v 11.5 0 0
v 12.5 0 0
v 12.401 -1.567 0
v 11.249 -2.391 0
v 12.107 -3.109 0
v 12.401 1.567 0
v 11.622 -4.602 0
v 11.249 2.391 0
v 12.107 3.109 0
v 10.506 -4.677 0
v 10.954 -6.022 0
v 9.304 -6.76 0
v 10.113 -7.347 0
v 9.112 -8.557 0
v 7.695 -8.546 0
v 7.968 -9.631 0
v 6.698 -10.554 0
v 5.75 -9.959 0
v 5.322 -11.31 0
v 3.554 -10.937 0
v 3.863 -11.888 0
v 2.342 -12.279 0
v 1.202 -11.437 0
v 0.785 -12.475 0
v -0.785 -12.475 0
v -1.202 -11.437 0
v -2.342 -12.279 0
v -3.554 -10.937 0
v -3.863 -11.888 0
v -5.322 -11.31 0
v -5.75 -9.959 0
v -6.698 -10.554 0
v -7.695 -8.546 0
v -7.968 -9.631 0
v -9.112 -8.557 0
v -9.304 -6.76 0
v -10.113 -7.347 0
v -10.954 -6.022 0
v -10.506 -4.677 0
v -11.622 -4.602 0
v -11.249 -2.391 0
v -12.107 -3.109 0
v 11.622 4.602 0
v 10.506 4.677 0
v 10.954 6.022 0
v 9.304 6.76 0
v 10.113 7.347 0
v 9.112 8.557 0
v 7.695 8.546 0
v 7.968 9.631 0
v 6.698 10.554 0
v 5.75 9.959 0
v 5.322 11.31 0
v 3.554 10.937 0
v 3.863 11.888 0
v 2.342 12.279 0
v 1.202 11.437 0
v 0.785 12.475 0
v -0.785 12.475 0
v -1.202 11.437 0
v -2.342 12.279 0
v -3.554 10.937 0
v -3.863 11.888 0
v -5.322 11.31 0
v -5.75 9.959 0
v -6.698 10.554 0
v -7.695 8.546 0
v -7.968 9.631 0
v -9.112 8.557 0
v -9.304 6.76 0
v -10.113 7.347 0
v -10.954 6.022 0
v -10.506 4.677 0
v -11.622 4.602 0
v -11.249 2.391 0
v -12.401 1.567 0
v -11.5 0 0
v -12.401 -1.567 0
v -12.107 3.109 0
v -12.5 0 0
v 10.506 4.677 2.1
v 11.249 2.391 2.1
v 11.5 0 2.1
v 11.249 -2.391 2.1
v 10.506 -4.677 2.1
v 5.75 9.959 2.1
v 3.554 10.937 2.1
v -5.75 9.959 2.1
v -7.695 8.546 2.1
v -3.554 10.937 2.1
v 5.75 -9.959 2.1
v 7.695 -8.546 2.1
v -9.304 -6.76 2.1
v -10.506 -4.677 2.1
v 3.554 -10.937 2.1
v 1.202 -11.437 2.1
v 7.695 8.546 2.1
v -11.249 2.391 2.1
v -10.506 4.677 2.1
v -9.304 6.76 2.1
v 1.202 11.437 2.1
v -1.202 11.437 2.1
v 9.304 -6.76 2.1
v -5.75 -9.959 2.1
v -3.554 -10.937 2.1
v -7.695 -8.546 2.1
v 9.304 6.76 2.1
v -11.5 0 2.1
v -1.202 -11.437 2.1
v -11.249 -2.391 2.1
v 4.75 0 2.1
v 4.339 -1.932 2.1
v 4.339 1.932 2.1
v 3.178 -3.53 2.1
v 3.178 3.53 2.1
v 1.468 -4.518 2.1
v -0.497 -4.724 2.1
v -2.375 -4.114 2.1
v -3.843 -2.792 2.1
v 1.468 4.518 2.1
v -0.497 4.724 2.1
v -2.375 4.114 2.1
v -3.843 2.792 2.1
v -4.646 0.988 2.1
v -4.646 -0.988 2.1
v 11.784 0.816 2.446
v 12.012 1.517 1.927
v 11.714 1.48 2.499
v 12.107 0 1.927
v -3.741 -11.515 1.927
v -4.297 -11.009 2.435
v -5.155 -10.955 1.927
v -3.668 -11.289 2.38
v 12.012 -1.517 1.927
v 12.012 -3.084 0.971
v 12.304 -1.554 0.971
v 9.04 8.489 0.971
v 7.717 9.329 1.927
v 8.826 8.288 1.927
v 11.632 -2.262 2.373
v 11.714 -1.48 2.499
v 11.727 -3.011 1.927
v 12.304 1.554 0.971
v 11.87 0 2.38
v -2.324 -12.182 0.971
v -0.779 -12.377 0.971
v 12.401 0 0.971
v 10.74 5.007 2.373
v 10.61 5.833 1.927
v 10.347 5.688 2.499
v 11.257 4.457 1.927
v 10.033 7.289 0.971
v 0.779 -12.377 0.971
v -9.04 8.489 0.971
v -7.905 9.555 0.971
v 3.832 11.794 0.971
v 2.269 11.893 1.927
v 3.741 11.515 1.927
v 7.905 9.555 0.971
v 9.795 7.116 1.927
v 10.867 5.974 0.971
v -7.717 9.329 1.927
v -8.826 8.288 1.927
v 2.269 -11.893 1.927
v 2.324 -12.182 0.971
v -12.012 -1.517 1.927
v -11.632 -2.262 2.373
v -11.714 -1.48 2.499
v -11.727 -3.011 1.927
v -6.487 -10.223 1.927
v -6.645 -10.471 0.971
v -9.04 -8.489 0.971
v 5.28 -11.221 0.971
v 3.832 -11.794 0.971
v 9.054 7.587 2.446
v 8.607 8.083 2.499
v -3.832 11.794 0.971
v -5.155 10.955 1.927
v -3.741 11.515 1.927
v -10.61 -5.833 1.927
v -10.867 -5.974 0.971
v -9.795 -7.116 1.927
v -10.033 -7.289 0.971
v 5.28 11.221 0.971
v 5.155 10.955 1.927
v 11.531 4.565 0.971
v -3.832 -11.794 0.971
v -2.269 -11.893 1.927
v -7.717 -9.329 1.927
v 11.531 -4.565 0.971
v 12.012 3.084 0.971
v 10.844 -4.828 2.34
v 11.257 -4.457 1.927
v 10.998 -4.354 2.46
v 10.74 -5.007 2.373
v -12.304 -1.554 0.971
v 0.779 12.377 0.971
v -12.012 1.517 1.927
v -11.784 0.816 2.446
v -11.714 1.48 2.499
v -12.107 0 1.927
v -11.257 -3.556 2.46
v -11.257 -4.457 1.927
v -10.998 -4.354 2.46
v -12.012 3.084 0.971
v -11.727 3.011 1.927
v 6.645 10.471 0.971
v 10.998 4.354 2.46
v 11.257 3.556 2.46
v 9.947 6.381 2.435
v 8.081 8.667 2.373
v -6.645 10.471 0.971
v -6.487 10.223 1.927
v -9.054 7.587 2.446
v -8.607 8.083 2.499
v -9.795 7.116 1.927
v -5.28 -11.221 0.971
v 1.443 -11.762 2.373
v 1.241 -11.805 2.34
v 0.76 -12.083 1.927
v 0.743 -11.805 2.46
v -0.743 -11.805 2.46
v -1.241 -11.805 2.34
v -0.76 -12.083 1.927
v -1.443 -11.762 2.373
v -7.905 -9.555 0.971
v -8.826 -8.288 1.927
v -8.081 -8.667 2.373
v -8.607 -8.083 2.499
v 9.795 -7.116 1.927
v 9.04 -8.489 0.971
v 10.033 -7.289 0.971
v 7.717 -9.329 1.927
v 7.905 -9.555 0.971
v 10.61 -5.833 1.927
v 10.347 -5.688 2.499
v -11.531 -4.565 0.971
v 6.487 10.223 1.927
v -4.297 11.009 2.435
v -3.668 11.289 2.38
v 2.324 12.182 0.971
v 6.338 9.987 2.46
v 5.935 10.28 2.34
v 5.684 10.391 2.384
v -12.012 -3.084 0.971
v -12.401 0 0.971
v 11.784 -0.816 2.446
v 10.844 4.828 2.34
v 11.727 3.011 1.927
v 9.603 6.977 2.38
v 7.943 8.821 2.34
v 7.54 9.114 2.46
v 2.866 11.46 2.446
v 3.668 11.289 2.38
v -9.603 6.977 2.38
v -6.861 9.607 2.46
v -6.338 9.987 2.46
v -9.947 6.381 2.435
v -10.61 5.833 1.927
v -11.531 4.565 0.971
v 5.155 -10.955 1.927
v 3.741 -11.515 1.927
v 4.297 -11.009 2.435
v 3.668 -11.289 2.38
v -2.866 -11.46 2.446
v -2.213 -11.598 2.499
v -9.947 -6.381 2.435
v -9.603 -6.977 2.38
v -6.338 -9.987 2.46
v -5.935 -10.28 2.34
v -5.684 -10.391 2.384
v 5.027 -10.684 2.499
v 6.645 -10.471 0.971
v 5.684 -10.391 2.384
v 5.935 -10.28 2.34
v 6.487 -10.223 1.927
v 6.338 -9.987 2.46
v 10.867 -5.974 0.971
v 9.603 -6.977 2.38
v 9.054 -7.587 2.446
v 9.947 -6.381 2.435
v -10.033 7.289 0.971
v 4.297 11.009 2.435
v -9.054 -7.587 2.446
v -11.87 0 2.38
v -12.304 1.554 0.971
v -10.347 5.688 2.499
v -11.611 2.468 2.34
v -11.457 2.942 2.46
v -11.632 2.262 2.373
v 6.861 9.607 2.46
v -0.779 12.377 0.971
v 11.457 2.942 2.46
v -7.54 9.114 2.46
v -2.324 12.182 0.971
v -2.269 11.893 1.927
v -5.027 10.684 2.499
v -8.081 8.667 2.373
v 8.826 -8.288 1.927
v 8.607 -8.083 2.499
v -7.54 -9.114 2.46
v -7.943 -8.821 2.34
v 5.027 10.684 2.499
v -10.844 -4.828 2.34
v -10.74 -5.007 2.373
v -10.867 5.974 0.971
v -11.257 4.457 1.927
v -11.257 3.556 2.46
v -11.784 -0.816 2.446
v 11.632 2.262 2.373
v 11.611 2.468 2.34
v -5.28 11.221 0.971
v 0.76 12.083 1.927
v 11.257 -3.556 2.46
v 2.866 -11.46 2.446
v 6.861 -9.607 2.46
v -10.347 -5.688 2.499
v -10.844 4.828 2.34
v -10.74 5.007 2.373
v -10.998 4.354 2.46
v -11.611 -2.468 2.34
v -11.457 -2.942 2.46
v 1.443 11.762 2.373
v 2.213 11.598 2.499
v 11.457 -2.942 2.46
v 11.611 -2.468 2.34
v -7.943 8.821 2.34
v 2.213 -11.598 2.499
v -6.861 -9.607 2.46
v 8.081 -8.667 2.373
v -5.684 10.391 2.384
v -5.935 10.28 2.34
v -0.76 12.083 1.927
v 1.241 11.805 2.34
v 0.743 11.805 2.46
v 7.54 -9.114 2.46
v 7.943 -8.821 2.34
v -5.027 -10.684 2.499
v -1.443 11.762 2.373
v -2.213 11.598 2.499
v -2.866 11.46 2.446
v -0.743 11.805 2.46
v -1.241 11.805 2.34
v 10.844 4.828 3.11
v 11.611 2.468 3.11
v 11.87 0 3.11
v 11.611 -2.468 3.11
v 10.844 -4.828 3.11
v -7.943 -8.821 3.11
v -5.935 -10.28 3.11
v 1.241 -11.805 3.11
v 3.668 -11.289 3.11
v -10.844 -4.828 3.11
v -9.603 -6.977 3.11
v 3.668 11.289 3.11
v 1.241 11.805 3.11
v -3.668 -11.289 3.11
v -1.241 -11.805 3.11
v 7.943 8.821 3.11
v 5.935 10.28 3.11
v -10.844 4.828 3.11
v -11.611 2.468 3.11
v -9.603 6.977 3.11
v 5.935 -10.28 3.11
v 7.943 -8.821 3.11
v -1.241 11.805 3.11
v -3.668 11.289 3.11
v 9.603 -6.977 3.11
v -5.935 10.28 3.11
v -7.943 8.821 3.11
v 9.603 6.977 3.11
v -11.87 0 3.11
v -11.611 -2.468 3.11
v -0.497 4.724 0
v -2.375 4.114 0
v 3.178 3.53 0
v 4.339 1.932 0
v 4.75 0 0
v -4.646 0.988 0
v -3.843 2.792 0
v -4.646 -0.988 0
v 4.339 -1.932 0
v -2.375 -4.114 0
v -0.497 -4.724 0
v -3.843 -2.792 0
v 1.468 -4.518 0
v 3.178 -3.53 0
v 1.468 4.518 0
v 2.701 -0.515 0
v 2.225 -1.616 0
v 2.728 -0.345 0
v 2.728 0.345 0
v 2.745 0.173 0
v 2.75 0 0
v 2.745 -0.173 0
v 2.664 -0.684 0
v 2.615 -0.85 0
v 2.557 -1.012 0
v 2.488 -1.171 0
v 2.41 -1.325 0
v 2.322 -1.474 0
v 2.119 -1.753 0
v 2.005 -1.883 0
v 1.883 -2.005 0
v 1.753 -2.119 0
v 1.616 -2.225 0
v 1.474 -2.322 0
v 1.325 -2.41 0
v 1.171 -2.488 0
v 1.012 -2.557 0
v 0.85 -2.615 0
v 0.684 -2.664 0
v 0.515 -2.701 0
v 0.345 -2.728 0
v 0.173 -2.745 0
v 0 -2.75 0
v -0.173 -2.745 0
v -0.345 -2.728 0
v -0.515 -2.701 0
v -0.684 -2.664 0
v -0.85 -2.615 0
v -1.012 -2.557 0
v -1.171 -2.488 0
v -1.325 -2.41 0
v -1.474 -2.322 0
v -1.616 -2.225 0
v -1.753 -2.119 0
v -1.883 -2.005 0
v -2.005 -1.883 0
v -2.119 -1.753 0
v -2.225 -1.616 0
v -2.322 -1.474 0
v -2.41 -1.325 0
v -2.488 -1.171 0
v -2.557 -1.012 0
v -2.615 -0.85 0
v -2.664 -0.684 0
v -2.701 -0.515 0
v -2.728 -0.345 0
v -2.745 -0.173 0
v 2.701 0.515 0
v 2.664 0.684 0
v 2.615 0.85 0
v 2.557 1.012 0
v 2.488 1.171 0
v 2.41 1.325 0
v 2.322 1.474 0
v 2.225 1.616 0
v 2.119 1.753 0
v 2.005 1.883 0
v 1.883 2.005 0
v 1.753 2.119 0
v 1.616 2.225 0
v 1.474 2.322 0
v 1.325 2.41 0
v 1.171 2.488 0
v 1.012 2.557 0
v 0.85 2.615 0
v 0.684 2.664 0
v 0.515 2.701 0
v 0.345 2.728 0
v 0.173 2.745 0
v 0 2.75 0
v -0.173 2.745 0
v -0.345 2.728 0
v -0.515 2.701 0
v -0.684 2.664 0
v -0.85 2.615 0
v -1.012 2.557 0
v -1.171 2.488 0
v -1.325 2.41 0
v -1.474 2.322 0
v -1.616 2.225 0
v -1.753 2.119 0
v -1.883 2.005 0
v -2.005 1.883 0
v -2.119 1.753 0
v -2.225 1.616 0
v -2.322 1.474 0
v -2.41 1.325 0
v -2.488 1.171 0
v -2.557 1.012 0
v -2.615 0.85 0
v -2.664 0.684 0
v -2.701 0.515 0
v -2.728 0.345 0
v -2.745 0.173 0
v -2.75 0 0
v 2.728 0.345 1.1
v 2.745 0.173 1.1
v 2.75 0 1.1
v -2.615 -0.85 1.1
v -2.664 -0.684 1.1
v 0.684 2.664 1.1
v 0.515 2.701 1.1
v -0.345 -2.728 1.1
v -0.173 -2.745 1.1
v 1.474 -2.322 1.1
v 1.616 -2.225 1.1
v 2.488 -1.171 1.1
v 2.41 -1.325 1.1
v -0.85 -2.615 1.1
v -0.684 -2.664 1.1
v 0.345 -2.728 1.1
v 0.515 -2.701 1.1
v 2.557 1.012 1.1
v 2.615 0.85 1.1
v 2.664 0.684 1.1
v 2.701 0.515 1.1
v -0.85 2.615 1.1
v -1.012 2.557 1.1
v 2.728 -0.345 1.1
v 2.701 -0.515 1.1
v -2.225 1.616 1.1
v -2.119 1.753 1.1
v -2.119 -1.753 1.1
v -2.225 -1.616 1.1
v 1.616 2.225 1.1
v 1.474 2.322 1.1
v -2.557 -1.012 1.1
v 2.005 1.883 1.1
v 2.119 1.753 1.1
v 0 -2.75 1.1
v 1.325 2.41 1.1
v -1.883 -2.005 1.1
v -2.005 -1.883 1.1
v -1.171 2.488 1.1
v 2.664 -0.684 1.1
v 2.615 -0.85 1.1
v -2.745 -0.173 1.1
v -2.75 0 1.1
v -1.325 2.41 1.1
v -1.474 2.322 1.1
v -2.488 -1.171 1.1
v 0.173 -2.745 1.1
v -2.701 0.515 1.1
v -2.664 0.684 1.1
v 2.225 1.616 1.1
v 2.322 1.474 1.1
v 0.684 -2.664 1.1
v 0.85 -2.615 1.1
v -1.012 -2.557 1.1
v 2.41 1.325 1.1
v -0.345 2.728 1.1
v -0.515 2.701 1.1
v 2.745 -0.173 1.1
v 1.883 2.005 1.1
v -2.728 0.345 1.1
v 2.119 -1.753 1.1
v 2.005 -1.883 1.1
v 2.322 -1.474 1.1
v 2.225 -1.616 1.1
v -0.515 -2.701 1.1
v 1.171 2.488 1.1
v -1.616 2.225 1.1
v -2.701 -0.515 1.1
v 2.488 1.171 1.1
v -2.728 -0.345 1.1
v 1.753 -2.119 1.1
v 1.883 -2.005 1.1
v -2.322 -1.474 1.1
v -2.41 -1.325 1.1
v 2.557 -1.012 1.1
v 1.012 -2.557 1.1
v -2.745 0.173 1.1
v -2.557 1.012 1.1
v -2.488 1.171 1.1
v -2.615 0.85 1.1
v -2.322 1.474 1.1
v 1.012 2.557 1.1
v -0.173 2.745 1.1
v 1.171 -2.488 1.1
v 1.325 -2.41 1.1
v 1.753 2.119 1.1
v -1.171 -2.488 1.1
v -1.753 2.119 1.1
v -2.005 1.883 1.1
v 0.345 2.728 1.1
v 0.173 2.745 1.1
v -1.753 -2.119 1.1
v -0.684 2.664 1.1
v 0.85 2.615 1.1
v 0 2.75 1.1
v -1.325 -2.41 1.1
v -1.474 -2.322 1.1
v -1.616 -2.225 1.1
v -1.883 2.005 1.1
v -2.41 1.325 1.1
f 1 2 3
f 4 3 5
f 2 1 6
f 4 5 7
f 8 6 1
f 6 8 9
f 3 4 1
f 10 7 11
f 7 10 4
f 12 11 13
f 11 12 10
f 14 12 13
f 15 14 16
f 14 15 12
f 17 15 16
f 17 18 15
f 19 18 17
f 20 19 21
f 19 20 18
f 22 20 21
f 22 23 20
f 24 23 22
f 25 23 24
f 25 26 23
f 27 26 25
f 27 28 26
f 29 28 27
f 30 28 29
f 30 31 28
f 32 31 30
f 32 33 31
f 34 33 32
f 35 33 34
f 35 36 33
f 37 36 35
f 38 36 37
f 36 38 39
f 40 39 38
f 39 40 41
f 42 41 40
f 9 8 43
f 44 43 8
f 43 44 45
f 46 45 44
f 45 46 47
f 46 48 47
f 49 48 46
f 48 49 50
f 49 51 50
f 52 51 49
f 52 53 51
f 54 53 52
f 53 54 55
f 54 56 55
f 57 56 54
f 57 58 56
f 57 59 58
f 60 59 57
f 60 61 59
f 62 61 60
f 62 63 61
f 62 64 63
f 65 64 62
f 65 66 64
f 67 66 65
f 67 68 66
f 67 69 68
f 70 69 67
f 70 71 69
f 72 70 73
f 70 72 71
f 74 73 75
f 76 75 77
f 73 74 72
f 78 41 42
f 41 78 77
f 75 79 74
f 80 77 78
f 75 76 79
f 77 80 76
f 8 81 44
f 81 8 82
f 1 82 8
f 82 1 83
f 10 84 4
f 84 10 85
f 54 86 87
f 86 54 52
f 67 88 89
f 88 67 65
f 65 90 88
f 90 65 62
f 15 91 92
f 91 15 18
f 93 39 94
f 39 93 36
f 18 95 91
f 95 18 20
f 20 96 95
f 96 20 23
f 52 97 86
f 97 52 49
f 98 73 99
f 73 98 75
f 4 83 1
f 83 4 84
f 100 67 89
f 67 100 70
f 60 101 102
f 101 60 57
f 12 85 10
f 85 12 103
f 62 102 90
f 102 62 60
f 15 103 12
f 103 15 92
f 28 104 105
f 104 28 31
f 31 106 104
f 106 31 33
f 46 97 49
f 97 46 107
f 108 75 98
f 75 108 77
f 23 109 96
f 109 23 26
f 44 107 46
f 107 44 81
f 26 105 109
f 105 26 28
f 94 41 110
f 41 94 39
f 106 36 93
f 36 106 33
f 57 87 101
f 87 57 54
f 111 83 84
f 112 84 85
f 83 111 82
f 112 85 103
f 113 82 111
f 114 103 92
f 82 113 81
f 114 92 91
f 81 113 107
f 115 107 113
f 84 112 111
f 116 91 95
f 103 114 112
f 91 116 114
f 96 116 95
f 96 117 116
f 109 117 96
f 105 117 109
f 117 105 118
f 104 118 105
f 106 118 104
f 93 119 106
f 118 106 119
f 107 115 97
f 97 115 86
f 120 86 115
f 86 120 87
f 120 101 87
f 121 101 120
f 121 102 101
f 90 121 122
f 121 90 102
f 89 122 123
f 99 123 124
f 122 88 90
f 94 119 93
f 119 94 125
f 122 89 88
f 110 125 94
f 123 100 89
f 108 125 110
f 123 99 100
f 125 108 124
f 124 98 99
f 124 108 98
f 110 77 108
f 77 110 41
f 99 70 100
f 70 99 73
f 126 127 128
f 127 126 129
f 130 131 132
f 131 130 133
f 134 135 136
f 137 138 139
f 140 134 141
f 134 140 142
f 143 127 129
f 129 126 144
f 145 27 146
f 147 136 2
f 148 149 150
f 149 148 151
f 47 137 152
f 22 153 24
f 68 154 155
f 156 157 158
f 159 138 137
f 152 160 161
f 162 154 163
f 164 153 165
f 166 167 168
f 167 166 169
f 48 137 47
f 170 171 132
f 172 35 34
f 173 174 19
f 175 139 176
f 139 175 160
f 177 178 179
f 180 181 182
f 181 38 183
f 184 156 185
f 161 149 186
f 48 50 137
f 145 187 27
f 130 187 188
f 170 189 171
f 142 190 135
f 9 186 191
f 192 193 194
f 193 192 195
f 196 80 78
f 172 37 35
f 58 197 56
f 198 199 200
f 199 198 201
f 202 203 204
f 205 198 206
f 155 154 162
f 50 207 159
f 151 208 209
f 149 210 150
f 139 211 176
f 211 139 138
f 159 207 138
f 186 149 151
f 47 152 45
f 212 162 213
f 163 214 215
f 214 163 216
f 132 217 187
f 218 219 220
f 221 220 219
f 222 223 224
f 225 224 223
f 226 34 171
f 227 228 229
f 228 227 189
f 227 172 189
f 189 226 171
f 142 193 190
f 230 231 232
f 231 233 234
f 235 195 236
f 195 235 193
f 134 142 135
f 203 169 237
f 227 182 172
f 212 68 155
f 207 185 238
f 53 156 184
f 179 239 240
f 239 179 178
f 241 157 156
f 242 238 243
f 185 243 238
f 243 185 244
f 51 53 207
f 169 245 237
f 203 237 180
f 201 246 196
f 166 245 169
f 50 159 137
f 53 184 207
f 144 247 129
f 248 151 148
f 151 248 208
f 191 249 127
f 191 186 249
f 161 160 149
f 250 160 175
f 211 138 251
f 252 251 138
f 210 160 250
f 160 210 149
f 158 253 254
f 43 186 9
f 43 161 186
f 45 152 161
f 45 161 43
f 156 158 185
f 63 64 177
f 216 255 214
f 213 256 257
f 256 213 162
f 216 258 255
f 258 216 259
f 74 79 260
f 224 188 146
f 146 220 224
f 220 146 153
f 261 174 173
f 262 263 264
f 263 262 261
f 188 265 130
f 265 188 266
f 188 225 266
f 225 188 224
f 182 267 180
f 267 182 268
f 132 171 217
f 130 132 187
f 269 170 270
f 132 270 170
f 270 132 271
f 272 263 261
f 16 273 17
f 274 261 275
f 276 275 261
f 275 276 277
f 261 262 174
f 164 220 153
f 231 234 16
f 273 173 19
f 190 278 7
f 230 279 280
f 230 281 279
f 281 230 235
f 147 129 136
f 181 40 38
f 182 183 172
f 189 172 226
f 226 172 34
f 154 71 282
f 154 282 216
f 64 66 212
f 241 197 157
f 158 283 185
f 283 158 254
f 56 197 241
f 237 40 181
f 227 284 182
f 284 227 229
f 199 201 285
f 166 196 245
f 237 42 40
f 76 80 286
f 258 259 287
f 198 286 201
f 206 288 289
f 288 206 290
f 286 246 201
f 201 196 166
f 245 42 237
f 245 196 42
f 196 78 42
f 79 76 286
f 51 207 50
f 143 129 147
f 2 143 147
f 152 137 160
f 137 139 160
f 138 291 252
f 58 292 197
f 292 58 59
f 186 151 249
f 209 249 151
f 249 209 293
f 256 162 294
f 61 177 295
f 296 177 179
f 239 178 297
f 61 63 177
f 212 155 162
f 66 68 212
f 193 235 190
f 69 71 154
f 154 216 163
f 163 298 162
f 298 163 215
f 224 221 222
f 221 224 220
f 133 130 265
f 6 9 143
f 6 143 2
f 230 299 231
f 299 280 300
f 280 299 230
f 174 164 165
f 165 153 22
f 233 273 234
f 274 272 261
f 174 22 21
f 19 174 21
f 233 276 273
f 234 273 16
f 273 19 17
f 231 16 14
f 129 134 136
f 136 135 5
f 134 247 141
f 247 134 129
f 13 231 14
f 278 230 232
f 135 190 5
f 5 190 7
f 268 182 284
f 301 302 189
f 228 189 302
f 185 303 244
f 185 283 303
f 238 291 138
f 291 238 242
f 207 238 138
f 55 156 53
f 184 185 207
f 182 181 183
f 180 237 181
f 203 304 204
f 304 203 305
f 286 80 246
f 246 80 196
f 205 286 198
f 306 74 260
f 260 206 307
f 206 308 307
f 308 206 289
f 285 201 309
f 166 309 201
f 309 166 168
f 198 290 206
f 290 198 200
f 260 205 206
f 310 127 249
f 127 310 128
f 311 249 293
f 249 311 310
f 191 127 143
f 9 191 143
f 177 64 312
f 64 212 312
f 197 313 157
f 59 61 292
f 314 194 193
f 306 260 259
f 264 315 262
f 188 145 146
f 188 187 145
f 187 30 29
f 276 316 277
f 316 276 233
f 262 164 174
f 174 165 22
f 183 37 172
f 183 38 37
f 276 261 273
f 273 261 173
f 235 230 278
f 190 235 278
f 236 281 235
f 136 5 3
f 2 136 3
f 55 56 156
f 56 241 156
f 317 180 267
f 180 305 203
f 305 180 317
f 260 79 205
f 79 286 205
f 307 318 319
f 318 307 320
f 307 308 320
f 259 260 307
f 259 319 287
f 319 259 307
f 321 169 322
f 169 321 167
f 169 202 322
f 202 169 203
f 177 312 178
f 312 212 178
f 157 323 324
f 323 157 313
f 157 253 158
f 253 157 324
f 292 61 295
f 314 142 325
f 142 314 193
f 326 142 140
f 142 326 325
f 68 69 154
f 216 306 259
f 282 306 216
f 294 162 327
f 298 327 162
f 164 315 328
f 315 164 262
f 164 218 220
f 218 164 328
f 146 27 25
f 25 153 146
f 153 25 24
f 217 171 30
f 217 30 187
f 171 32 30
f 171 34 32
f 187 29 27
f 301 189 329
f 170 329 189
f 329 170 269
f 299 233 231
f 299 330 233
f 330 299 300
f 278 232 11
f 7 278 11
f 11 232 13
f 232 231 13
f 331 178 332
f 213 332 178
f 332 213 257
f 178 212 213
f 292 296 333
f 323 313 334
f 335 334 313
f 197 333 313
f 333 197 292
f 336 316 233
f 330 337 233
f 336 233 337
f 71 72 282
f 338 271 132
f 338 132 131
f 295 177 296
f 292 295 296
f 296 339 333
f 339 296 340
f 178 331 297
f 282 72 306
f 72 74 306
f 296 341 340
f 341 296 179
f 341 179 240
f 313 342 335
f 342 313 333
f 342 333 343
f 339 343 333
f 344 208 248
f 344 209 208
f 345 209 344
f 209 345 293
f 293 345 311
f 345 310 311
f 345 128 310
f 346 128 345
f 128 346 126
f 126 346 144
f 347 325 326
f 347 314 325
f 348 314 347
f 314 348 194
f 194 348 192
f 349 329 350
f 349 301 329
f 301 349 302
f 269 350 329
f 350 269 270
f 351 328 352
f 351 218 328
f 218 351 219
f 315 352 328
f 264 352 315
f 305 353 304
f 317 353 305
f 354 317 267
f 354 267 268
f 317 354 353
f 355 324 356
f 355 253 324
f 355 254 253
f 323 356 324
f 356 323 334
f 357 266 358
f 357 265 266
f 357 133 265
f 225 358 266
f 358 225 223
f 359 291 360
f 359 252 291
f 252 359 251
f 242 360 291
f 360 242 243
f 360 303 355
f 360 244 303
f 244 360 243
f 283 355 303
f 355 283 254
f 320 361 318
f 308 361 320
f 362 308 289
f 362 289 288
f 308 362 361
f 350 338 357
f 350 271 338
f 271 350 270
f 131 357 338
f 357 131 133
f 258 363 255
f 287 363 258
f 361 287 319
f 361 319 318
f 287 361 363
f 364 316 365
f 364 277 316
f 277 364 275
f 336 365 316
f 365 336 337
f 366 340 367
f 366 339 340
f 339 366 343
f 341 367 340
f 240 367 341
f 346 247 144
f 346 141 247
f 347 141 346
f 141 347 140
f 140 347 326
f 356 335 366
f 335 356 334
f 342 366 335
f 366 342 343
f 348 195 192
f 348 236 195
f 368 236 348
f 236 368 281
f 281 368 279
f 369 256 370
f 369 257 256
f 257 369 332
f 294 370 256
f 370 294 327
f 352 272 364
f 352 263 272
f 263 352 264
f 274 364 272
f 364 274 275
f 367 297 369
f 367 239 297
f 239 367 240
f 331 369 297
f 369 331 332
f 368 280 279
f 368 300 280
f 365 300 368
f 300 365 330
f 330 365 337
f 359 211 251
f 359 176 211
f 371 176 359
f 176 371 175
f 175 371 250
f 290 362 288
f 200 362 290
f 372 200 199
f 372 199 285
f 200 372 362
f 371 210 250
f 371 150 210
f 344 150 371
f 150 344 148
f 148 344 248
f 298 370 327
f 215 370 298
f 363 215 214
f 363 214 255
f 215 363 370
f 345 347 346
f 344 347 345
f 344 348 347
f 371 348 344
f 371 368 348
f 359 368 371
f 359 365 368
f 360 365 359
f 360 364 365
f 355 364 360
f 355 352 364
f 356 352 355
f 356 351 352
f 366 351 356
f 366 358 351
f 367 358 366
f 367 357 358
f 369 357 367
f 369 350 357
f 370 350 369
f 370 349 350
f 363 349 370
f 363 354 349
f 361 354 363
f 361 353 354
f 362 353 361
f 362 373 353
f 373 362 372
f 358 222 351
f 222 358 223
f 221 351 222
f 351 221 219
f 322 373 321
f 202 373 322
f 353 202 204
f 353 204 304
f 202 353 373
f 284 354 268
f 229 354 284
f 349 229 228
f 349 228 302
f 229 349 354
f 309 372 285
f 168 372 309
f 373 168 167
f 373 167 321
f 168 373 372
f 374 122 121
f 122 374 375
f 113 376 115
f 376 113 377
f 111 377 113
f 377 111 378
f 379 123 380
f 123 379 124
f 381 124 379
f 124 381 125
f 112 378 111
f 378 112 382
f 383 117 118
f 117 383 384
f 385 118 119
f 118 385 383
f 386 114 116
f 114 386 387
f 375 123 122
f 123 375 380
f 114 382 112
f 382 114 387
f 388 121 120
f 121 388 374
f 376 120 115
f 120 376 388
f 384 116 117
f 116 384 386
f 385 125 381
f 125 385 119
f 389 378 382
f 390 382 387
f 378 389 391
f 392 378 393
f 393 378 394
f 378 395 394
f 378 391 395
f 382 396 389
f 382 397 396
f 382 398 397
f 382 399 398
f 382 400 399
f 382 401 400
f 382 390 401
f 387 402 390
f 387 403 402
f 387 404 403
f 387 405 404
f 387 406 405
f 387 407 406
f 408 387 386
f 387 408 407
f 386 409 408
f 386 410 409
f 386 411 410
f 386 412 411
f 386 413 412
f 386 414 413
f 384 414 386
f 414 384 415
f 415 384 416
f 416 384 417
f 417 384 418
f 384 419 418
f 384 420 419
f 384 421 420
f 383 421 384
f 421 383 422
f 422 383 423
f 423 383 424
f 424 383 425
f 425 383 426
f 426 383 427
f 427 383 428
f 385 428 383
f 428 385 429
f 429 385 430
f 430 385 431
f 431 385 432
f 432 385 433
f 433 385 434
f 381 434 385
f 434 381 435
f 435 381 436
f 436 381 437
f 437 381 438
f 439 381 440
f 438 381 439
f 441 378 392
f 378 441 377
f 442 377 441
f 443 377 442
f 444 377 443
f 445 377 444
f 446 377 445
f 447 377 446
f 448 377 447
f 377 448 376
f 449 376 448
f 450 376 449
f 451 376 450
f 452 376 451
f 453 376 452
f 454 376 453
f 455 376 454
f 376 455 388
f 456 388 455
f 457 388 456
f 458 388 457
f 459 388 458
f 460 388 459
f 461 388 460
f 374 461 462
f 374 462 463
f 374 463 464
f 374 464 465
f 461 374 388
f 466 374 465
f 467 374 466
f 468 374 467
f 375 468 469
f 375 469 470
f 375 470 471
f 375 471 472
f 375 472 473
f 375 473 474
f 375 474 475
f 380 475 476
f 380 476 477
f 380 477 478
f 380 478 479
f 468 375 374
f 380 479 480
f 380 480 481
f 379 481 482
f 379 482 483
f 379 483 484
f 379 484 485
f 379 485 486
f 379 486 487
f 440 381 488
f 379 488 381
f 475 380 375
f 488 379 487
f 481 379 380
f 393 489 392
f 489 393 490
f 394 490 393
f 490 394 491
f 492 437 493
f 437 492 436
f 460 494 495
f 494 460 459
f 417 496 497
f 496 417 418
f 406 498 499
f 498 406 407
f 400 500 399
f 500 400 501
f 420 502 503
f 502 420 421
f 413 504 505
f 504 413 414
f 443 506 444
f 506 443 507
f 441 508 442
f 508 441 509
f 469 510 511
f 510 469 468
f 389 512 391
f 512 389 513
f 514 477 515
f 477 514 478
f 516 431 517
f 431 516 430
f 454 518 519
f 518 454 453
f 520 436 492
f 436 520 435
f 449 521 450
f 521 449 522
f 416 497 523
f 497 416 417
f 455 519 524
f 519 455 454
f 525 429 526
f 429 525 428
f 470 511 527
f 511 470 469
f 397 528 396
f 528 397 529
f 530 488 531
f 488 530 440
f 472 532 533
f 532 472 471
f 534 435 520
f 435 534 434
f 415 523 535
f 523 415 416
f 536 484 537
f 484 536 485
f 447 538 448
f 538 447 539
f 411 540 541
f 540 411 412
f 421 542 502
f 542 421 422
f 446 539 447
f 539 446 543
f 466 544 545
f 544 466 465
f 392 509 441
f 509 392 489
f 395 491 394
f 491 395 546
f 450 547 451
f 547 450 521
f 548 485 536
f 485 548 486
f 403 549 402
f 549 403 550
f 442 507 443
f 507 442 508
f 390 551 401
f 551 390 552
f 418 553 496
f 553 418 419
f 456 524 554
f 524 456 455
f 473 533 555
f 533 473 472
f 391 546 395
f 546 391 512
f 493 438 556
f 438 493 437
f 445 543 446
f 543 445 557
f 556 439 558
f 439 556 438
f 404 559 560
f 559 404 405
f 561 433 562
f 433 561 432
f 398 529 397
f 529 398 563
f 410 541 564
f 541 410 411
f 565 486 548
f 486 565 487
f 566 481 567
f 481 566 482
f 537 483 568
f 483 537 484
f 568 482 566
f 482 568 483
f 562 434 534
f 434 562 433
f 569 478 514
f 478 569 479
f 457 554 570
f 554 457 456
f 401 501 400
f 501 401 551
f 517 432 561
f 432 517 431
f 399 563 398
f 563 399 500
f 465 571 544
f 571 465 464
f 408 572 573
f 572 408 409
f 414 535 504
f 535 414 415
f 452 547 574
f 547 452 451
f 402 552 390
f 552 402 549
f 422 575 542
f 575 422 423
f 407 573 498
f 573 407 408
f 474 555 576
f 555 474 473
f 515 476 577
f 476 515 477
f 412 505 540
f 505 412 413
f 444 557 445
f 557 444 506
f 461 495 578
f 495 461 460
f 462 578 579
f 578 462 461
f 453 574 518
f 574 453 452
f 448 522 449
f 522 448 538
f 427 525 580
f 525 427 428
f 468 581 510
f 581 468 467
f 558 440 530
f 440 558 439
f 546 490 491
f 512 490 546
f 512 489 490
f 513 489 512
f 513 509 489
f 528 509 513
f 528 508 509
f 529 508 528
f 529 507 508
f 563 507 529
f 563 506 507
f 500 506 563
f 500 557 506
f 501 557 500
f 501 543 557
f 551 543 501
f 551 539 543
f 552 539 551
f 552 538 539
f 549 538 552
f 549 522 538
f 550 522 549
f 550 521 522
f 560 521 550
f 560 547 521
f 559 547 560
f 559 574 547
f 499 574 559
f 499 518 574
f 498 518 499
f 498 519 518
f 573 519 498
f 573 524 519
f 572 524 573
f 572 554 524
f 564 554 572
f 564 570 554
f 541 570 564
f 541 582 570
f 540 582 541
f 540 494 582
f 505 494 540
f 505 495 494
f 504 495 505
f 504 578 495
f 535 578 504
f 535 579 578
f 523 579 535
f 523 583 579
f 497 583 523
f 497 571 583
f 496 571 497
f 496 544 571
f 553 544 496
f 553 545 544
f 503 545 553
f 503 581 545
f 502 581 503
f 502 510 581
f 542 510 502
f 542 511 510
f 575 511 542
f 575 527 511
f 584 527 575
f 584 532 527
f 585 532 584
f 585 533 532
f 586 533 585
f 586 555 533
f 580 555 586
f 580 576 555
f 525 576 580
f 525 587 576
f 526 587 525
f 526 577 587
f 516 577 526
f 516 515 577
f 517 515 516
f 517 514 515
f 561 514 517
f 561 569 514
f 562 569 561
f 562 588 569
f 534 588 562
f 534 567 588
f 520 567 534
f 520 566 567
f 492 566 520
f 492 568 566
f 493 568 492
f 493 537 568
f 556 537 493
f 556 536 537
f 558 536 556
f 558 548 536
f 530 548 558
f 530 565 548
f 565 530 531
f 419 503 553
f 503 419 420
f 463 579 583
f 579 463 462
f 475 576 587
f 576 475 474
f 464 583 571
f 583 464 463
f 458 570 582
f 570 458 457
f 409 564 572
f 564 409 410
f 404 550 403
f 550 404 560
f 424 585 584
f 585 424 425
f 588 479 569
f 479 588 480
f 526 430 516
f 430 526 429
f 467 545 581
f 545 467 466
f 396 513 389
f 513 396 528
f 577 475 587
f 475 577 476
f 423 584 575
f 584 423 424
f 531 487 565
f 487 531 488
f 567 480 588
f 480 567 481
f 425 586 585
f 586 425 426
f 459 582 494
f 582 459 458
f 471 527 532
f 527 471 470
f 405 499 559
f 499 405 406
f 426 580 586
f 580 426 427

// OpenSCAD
// Rounded bases, plain and textured
// (c) 2024, Juan Vera. Based on a previous design in Blender

/* Parameters */

// Diameter of the base (mm)
base_w = 25; // [10:100]
// Secondary diameter of the base (mm). Only used for the horse bases
base_w2 = 50; // [10:100]
base_texture=0; //  [0:Plain, 1:PlainHorses, 2:Bricks, 3:BricksHorses, 4:Plates, 5:Grid, 6:pathway]
// Diameter of the magnet hole (mm). Add 0.5 for some tolerance
magnet_d = 5.5; // [2:0.5:10]
// Height of the hole (mm). Add 0.1 for some tolerance
magnet_h = 1.1; // [1:0.1:3.1]

/* [Bricks] */
// x size of the bricks (mm)
brick_x = 6.5; // [2:0.5:20]
// y size of the bricks (mm)
brick_y = 4.5; // [2:0.5:20]
// separation of the bricks, in x, relative to brick_x
brick_sep_x=1.01; // [1:0.01:1.5]
// separation of the bricks, in y, relative to brick_y
brick_sep_y=1.01; // [1:0.01:1.5]
// factor to sink the top of the brick
brick_f=0.99; // [0.95:0.01:1]
// offset of the bricks for odd lines lines (mm)
brick_offset=3.25; // [0:0.25:10]

/* [Hidden] */
// note: many dimensions are constant, because I want to match a base I modeled years ago in blender
// DO NOT CHANGE THESE VALUES. The final base will scale these values
// they are relative to a standard 25mm base
hole_r = 25/2-1; // dimensions of the hole. If hole_r==0, do not make a hole
hole_d = 2.1; // depth of the hole
base_total_height = 3.11; // The total height of the base
base_upper_r = 11.87; // The radius of the upper surface of a 25mm base
base_upper_h = 1; // The height of the upper surface of a 25mm base

module base_body(hole_r, hole_d) {
    difference() {
        // the dimensions are constant and equal to a 25mm base I modeled in blendered years ago
        // I want this model to be a copy of that base
        difference() {
            scale([1, 1, 0.62]) sphere(r=25 / 2, $fn=50);
            union() {
                translate([0, 0, 5+2.5]) cube([30, 30, 10], center=true);
                translate([0, 0, -5]) cube([30, 30, 10], center=true);
                if(hole_r > 0) {
                    cylinder(h=2*hole_d, r=hole_r, center=true);
                }
            }
        }
    }
}

module magnet_encase(magnet_d, magnet_h, encase_d, encase_h) {
    difference() {
        cylinder(d=encase_d, h=encase_h);
        cylinder(d=magnet_d, h=magnet_h*2, $fn=100, center=true);
    }
}

////////////////////// plain surface
module base_plain(base_w, magnet_d, magnet_h) {
    scale([base_w / 25, base_w / 25, 1]) {
        union() {
            base_body(hole_r, hole_d);
            translate([0, 0, 2.11]) cylinder(h=base_upper_h, r=base_upper_r);
        }
    }
    magnet_encase(magnet_d, magnet_h, magnet_d+4, 2.45);
}
module base_plain_horses(base_w1, base_w2, magnet_d, magnet_h) {
    scale([base_w1 / 25, base_w2 / 25, 1]) {
        union() {
            base_body(hole_r, hole_d);
            translate([0, 0, 2.11]) cylinder(h=base_upper_h, r=base_upper_r);
        }
    }
    translate([0, base_w2/4, 0]) magnet_encase(magnet_d, magnet_h, magnet_d+4, 2.45);
    translate([0, -base_w2/4, 0]) magnet_encase(magnet_d, magnet_h, magnet_d+4, 2.45);
}

////////////////////// bricks surface
module brick(x, y, h, r=1, fn=16, f=brick_f) {
    /* A brick using hull()
    hull() {
        translate([-x/2, -y/2, base_upper_h/2]) sphere(r=0.5, $fn=12);
        translate([x/2, -y/2, base_upper_h/2]) sphere(r=0.5, $fn=12);
        translate([x/2, y/2, base_upper_h/2]) sphere(r=0.5, $fn=12);
        translate([-x/2, y/2, base_upper_h/2]) sphere(r=0.5, $fn=12);
        
        translate([-x/2, -y/2, -base_upper_h/2]) sphere(r=0.5, $fn=12);
        translate([x/2, -y/2, -base_upper_h/2]) sphere(r=0.5, $fn=12);
        translate([x/2, y/2, -base_upper_h/2]) sphere(r=0.5, $fn=12);
        translate([-x/2, y/2, -base_upper_h/2]) sphere(r=0.5, $fn=12);
    }*/
    
    /* A brick using simple shapes. Faster? */
    translate([r, r, -r]) union() {
        translate([0, 0, r]) sphere(r=r, $fn=fn);
        translate([x-2*r, 0, r]) sphere(r=r, $fn=fn);
        translate([0, y-2*r, r]) sphere(r=r, $fn=fn);
        translate([x-2*r, y-2*r, r]) sphere(r=r, $fn=fn);
        
        translate([0, y-2*r, r]) rotate([90, 0, 0]) rotate([0, 0, 180/fn]) cylinder(r=r, h=y-2*r, $fn=fn);
        translate([x-2*r, y-2*r, r]) rotate([90, 0, 0]) rotate([0, 0, 180/fn]) cylinder(r=r, h=y-2*r, $fn=fn);
        
        translate([0, y-2*r, r]) rotate([0, 90, 0]) rotate([0, 0, 180/fn]) cylinder(r=r, h=x-2*r, $fn=fn);
        translate([0, 0, r]) rotate([0, 90, 0]) rotate([0, 0, 180/fn]) cylinder(r=r, h=x-2*r, $fn=fn);
        
        translate([0, 0, 0]) cube([x-2*r, y-2*r, r*2*f]);
    }
    
    /* A brick using a cuboid
    You also need:
    include <BOSL/constants.scad>
    use <BOSL/shapes.scad>
    cuboid([x,y,h], fillet=0.5);
    */
}
module bricks_surface(brick_x, brick_y, brick_o, base_w, base_w2, sep_x=1.2, sep_y=1.2, brick_r=1) {
    intersection() {
        // brick_x, brick_y: size of the brick
        // brick_o: offset of each line of the brick
        // base_w: size of the base
        scale([base_w/25, base_w2/25, 1]) cylinder(h=10, r=base_upper_r);
        first_x = base_w / brick_x / 2 + 1;
        first_y = base_w2 / brick_y / 2 + 1;
        // small translation for stetics
        translate([0,0.2,0]) union() {
            for(i=[-first_x:first_x]) {
                for(j=[-first_y:first_y]) {
                    translate([i*sep_x*brick_x + (j%2)*brick_o, j*sep_y*brick_y, 0]) brick(brick_x, brick_y, base_upper_h, r=brick_r);
                }
            }
        }
    }
}
module base_bricks(base_w, magnet_d, magnet_h) {
    scale([base_w / 25, base_w / 25, 1]) base_body(hole_r, hole_d);
    translate([0, 0, 2.11]) {
        // use these number for the custom brick
        bricks_surface(brick_x, brick_y, brick_offset, base_w, base_w, brick_sep_x, brick_sep_y);
        // use these numbers for the hull() brick
        //bricks_surface(5.6, 3.9, 3.1, base_w, base_w, 1.2, 1.3);
    }
    magnet_encase(magnet_d, magnet_h, magnet_d+4, 2.45);
}
module base_bricks_horses (base_w1, base_w2, magnet_d, magnet_h) {
    union() {
        scale([base_w/25, base_w2/25, 1]) base_body(hole_r, hole_d);
        translate([0, 0, 2.11]) {
            // use these number for the custom brick
            bricks_surface(brick_x, brick_y, brick_offset, base_w, base_w2, brick_sep_x, brick_sep_y);
            // use these numbers for the hull() brick
            // bricks_surface(5.6, 3 * 25 / base_w2, base_w2, 3.1, 25, 1.2, 1.7);
        }
    }
    translate([0, base_w2/4, 0]) magnet_encase(magnet_d, magnet_h, magnet_d+4, 2.45);
    translate([0, -base_w2/4, 0]) magnet_encase(magnet_d, magnet_h, magnet_d+4, 2.45);
}
module base_plates(base_w, magnet_d, magnet_h) {
    scale([base_w / 25, base_w / 25, 1]) base_body(hole_r, hole_d);
    translate([0, 0, 2.11]) {
        // use these number for the custom brick
        bricks_surface(10, 10, 0, base_w, base_w, 0.99, 0.99);
        // use these numbers for the hull() brick
        //bricks_surface(10, 10, 0, base_w);
    }
    magnet_encase(magnet_d, magnet_h, magnet_d+4, 2.45);
}

module base_pathway(base_w, magnet_d, magnet_h) {
    scale([base_w / 25, base_w / 25, 1]) base_body(hole_r, hole_d);
    translate([0, 0, 2.11]) {
        // use these number for the custom brick
        bricks_surface(8, 8, 4, base_w, base_w, 0.9, 0.9);
    }
    magnet_encase(magnet_d, magnet_h, magnet_d+4, 2.45);
}


////////////////////// grill surface
module grill_surface(grill_w, grill_s, base_w) {
    intersection() {
        cylinder(h=10, r=base_upper_r * base_w / 25);
        first_x = base_w / grill_w / 2 + 1;
        union() {
            for(i=[-first_x:first_x]) {
                translate([i*grill_w, -base_w/2, 0]) cube([grill_s, base_w*2, base_upper_h]);
                translate([-base_w/2, i*grill_w, 0]) cube([base_w*2, grill_s,  base_upper_h]);
            }
        }
    }
}
module base_grill(base_w, magnet_d, magnet_h) {
    scale([base_w / 25, base_w / 25, 1]) base_body(hole_r, hole_d);
    translate([0, 0, 2.11]) grill_surface(2, 0.5, base_w);
    magnet_encase(magnet_d, magnet_h, magnet_d+4, 2.45);
}


//////////////////////////////// bricks

module base(base_texture, base_w, magnet_d, magnet_h) {
    if(base_texture == 0) { // plain
        base_plain(base_w, magnet_d, magnet_h);
    }
    if(base_texture == 1) { // plain horses
        base_plain_horses(base_w, base_w2, magnet_d, magnet_h);
    }
    if(base_texture == 2) { // bricks
        base_bricks(base_w, magnet_d, magnet_h);
    }
    if(base_texture == 3) { // bricks horses
        base_bricks_horses(base_w, base_w2, magnet_d, magnet_h);
    }
    if(base_texture == 4) { // plates
        base_plates(base_w, magnet_d, magnet_h);
    }
    if(base_texture == 5) { // grill
        base_grill(base_w, magnet_d, magnet_h);
    }
    if(base_texture == 6) { // pathway
        base_pathway(base_w, magnet_d, magnet_h);
    }
}

base(base_texture, base_w, magnet_d, magnet_h);
